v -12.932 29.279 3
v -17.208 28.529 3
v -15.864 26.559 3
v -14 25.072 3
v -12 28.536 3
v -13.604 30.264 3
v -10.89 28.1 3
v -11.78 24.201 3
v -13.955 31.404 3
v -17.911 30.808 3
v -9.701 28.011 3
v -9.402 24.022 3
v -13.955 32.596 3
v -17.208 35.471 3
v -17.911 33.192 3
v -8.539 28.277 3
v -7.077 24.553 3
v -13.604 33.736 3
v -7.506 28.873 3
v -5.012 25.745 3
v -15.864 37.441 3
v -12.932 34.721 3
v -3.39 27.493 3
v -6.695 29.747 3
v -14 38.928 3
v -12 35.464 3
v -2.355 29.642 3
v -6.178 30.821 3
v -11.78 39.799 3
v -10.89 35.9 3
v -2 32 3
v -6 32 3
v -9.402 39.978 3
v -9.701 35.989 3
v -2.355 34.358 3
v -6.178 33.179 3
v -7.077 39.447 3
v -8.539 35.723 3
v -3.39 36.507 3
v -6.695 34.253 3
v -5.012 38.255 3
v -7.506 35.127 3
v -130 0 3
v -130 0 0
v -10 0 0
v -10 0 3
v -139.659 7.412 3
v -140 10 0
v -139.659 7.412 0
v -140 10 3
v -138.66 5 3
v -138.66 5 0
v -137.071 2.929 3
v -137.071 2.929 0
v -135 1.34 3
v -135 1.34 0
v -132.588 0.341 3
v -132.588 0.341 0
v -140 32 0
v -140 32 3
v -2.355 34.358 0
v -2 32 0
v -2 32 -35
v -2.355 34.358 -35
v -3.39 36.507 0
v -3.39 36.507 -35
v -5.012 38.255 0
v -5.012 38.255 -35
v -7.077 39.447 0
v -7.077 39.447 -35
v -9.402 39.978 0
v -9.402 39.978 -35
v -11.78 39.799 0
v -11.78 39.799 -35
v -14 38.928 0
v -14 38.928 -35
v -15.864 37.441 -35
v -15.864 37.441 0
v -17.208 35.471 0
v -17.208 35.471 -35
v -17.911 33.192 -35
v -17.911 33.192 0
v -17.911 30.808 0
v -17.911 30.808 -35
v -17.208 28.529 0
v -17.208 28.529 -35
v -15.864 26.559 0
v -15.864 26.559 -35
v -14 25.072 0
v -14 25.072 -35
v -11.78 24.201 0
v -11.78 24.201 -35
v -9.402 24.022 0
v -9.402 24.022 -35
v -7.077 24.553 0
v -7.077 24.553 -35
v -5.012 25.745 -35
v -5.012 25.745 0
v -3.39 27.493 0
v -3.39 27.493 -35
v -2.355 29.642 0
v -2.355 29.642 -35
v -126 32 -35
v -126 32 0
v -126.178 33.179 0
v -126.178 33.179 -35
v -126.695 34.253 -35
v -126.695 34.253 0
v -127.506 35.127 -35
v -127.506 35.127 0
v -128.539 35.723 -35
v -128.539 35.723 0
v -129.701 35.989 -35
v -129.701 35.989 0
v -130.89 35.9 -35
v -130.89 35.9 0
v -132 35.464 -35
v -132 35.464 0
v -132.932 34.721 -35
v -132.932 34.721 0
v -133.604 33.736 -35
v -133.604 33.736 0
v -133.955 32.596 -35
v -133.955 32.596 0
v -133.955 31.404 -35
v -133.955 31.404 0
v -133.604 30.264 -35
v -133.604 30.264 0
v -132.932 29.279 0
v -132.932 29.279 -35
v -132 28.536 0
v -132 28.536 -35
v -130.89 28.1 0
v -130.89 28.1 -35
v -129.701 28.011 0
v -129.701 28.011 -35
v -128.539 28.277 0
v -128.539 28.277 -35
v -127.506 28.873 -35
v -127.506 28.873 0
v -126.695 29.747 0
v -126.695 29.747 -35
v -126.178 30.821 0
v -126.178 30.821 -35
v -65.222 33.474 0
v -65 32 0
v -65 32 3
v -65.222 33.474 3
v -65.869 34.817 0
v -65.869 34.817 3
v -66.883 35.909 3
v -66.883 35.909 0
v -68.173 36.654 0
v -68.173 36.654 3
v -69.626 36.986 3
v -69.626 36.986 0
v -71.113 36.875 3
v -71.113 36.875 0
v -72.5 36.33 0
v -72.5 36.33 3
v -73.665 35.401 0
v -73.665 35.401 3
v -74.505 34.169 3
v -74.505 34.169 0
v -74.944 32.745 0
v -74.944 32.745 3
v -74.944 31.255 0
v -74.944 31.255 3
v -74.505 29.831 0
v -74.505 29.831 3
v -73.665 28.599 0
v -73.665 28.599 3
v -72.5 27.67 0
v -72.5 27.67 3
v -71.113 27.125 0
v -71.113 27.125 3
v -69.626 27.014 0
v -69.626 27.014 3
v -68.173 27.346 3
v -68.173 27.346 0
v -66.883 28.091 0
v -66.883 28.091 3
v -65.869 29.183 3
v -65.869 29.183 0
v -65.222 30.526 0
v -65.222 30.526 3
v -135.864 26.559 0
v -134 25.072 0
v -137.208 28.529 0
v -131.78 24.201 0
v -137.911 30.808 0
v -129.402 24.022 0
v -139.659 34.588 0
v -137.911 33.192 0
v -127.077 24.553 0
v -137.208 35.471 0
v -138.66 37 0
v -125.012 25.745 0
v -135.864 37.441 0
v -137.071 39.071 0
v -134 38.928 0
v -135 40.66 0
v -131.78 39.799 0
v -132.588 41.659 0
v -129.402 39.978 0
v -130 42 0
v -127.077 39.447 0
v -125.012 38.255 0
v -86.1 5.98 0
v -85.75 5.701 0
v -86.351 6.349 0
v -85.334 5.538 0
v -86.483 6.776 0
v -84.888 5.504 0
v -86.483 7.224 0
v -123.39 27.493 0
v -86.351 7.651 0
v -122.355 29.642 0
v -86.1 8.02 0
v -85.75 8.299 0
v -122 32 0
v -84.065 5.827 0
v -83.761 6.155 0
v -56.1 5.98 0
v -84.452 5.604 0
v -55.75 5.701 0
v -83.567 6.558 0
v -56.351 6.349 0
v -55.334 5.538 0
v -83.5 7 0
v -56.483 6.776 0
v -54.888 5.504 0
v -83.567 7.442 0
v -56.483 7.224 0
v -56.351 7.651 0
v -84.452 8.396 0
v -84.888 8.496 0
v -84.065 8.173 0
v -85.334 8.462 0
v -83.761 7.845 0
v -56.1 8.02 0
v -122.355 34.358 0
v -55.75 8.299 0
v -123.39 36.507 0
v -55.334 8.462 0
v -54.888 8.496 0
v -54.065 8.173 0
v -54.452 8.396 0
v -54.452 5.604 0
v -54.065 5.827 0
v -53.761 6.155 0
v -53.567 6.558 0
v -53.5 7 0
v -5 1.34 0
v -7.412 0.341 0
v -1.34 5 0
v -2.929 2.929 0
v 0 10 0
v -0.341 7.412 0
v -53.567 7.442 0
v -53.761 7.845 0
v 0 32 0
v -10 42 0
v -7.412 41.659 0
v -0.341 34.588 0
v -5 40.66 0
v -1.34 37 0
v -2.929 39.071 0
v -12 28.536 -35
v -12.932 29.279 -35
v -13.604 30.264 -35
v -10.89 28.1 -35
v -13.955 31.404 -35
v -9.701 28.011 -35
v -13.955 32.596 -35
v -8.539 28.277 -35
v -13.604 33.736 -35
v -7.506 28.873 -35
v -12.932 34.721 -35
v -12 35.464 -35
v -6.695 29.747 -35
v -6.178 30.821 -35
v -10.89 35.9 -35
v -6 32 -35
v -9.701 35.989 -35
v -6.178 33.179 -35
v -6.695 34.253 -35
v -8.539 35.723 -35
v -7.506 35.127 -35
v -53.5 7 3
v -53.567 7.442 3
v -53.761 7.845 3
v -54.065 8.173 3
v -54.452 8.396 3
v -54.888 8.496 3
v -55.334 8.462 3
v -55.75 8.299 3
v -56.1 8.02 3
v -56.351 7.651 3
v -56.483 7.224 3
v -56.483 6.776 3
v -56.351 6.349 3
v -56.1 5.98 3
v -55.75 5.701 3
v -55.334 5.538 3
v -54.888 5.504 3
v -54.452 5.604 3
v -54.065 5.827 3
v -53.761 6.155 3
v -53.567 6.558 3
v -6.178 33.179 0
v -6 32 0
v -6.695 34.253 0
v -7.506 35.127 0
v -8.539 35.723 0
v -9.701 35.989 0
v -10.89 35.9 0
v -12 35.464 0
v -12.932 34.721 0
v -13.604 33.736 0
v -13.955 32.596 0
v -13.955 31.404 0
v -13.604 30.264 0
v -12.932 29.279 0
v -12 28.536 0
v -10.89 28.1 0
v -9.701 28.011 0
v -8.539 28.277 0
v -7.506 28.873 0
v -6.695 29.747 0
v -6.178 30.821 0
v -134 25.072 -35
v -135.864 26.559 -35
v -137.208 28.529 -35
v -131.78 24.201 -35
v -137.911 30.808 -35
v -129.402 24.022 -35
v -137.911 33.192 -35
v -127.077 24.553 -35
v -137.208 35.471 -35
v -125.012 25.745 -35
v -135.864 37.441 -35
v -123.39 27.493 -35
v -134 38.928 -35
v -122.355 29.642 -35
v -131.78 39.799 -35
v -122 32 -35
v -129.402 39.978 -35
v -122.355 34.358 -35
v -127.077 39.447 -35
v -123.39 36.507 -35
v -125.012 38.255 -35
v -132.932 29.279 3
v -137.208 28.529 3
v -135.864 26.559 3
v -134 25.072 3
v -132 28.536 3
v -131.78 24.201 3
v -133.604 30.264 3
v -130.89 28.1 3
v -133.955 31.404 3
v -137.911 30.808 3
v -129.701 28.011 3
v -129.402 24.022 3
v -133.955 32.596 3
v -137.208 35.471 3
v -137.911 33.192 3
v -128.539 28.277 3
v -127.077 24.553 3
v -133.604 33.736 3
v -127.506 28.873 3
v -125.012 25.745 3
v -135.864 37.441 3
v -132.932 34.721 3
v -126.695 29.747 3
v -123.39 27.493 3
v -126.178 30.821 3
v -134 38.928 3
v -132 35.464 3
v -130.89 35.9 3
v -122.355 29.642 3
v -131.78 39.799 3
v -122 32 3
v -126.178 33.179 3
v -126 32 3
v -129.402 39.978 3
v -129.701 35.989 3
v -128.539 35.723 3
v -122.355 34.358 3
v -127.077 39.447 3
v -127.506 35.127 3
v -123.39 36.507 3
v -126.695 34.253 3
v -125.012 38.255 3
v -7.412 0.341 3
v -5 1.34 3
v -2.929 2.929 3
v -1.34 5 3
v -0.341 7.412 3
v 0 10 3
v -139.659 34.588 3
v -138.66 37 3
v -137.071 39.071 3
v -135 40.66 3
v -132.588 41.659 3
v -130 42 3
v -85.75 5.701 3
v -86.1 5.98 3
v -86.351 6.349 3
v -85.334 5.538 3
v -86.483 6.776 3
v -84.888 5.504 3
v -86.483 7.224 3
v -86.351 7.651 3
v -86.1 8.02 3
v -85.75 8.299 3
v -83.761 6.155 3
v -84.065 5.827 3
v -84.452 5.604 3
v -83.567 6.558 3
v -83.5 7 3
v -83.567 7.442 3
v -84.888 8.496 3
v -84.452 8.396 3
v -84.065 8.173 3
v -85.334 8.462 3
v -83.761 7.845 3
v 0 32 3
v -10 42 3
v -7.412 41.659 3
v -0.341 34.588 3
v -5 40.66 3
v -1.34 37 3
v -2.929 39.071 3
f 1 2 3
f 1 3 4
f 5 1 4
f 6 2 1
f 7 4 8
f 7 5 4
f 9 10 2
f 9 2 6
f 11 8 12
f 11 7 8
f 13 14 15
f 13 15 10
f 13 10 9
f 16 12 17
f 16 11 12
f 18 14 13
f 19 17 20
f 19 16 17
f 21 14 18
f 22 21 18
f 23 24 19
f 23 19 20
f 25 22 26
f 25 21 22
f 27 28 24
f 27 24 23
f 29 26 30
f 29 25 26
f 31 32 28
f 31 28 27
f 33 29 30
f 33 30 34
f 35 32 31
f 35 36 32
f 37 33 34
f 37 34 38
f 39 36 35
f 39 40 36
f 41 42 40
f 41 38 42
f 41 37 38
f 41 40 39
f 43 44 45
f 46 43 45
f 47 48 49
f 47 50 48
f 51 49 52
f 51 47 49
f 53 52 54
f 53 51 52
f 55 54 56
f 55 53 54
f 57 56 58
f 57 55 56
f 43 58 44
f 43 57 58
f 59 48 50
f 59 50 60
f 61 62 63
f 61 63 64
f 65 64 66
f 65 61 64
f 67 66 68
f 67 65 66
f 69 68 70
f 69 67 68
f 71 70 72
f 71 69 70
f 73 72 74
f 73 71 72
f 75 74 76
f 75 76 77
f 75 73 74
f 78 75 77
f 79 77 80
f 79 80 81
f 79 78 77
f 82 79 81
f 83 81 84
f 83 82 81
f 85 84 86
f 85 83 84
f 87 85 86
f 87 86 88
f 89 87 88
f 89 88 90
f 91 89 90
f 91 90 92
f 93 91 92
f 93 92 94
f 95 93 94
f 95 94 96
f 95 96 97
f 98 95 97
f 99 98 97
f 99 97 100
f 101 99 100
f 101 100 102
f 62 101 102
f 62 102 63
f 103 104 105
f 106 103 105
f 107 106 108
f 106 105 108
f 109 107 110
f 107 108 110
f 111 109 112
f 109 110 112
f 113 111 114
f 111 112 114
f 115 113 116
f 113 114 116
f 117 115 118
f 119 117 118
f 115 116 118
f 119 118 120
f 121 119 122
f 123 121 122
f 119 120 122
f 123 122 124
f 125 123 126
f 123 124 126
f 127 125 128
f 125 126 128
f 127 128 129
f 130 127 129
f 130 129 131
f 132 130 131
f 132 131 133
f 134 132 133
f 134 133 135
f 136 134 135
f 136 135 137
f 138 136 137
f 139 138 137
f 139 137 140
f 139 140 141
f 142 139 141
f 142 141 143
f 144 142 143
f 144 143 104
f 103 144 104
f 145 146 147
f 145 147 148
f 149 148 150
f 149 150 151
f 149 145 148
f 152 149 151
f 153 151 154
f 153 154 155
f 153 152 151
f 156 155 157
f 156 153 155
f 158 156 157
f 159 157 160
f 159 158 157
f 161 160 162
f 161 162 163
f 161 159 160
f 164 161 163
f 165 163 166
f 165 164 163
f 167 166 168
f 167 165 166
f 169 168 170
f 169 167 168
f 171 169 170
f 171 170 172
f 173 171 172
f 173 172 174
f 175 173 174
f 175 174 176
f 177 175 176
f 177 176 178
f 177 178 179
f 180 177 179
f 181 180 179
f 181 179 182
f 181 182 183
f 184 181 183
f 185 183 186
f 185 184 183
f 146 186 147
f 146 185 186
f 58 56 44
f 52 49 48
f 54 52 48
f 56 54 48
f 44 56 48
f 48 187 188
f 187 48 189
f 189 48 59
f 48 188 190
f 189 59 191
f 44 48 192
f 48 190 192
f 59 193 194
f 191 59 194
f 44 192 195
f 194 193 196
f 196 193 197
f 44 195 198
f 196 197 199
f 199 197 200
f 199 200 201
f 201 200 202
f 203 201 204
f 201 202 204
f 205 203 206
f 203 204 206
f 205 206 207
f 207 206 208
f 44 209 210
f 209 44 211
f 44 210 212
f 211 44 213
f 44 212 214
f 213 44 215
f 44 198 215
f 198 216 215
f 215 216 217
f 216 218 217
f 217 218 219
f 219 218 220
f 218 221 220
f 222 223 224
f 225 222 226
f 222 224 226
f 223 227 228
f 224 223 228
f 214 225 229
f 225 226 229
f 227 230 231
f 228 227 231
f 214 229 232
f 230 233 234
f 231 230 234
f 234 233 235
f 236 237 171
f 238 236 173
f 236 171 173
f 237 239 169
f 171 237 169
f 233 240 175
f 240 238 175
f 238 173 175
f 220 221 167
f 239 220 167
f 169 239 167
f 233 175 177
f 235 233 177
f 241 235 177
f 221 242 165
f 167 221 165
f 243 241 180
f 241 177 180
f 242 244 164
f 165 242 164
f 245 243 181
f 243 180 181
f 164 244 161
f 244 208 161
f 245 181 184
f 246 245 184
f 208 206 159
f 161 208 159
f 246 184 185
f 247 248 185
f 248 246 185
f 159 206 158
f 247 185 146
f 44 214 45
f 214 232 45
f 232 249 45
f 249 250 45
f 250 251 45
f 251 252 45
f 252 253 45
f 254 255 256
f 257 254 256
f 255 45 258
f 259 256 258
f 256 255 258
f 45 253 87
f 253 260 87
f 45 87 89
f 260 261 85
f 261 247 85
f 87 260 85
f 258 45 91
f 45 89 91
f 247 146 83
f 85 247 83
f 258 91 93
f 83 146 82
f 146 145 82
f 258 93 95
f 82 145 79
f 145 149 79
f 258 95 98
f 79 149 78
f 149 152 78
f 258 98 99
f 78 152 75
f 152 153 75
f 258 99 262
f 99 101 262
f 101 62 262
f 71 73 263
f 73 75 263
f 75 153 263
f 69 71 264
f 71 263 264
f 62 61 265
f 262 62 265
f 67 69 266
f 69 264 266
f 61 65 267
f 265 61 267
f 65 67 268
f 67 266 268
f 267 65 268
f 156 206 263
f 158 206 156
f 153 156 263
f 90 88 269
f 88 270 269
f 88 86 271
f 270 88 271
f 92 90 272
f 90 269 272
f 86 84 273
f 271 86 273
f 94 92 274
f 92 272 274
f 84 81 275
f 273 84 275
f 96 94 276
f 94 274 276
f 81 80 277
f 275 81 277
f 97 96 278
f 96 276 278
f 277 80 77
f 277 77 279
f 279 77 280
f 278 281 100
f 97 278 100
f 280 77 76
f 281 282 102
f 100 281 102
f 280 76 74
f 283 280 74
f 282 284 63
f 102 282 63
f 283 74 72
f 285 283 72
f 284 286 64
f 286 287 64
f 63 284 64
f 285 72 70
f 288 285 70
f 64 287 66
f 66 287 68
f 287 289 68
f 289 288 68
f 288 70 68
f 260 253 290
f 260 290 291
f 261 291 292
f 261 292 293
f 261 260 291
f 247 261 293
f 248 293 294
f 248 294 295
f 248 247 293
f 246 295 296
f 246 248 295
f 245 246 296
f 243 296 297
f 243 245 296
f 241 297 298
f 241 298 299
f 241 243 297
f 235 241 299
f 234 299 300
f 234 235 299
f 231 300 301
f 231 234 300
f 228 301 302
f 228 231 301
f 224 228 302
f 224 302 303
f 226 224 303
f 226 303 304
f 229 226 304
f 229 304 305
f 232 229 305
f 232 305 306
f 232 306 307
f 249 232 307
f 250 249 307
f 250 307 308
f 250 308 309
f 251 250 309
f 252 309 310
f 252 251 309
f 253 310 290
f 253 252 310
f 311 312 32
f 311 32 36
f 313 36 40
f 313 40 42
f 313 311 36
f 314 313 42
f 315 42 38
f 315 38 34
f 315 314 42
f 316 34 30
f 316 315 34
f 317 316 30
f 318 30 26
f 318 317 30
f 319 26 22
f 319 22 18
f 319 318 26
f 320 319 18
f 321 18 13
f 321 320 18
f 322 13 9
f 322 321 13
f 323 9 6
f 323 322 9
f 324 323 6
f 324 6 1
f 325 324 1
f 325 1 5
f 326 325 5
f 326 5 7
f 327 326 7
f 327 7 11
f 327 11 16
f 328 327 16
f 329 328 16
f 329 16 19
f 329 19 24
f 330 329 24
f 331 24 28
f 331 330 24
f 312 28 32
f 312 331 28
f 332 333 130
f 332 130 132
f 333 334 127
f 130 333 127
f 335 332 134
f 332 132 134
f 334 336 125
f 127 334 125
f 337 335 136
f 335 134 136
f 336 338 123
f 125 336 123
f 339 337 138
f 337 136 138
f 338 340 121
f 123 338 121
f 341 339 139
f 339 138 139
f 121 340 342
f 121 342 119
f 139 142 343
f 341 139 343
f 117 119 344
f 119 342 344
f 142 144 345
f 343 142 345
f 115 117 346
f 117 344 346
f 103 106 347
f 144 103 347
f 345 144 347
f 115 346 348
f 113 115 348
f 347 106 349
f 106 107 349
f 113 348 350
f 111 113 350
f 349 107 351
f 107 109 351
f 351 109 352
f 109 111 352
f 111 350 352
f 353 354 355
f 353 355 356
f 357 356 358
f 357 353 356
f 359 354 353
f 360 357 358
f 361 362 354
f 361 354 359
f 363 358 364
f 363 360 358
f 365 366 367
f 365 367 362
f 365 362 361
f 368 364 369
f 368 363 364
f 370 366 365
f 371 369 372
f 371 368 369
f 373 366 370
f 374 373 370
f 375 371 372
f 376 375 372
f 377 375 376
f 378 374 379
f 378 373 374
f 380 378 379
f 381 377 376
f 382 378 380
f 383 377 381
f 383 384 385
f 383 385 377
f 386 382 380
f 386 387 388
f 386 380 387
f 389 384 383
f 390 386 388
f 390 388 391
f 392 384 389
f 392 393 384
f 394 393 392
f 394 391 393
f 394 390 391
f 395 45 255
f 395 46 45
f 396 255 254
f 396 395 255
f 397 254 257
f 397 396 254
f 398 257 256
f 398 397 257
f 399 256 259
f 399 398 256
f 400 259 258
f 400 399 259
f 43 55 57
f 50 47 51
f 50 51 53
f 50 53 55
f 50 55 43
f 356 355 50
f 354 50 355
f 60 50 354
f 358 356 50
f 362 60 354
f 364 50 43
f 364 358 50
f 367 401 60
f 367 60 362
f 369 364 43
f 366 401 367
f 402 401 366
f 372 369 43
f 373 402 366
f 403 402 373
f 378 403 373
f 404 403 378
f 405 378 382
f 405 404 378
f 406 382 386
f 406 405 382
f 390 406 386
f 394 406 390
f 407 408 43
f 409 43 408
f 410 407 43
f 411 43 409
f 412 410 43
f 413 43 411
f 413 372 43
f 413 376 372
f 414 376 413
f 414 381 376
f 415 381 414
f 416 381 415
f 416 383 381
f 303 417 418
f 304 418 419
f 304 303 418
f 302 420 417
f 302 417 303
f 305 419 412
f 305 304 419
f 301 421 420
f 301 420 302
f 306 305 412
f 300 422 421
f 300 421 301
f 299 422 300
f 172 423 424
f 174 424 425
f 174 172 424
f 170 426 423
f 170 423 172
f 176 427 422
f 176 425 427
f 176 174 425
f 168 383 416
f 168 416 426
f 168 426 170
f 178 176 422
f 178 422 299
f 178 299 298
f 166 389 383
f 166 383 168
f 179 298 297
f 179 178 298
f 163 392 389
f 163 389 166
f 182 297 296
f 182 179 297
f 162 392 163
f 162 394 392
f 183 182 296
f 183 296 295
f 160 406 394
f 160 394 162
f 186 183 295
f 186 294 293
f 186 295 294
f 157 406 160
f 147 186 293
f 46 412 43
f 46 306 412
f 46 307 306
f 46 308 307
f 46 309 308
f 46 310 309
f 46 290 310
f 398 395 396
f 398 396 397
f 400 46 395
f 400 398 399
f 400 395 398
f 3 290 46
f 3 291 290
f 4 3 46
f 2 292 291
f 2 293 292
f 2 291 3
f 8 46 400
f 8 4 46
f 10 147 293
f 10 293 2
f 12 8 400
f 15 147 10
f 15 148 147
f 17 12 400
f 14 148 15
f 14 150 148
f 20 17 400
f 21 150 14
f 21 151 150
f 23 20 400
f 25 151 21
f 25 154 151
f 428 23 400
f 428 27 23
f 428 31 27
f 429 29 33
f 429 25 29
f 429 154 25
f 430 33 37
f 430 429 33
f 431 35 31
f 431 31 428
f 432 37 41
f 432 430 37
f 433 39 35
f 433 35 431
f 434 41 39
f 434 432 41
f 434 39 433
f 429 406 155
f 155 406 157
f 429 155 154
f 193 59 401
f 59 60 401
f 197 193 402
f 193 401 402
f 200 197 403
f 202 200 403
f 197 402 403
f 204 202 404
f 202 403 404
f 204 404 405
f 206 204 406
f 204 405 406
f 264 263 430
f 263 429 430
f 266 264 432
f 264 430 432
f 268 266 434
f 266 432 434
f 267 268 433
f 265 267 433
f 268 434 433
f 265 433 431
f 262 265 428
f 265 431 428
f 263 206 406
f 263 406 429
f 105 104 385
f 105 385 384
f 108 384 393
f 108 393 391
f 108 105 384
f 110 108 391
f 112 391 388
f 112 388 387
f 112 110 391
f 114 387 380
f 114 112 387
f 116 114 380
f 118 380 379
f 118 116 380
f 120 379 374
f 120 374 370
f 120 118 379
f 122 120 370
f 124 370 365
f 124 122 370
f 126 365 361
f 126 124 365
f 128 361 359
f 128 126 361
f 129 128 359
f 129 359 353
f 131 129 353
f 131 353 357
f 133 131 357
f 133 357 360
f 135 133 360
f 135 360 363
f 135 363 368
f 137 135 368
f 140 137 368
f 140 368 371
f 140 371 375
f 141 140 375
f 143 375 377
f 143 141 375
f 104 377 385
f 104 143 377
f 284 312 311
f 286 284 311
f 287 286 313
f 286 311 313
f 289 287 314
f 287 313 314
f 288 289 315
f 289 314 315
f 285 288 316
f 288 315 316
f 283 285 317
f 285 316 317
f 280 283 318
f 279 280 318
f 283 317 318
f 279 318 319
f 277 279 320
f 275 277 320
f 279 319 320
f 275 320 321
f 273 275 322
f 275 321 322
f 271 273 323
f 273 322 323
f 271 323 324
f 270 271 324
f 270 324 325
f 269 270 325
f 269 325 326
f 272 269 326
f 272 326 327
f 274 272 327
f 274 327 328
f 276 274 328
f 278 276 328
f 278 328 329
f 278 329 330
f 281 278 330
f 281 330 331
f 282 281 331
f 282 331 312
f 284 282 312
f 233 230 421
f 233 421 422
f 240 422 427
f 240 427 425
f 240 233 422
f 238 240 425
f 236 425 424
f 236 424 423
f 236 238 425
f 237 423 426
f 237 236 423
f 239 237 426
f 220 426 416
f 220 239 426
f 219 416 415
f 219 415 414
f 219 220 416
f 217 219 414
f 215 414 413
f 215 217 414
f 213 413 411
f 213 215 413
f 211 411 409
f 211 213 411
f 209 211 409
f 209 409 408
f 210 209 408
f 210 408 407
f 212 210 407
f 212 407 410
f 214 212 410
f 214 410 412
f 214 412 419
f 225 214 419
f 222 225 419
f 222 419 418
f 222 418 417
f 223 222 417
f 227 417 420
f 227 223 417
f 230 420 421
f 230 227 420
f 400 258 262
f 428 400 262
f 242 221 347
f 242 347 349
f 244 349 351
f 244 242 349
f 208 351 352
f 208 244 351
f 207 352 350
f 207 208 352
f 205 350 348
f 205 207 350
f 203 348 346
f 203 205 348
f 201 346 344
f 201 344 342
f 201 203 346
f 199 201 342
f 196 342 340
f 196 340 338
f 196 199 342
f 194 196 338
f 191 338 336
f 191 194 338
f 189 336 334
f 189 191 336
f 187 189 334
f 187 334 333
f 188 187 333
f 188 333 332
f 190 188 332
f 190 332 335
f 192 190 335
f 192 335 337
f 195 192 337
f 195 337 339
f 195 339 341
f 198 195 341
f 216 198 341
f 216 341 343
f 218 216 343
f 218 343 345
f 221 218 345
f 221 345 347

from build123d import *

# Parameters (mm, degrees)
ESQUISSE1_W        = 140
ESQUISSE1_H        = 42
ESQUISSE1_R        = 5
ESQUISSE1_R_2      = 4
ESQUISSE1_R_3      = 1.5
BOSS_EXTRU_1_DEPTH = 3
CONG_1_R           = 10
CONG_2_R           = 10
ESQUISSE2_R        = 8
ESQUISSE2_R_2      = 4
BOSS_EXTRU_2_DEPTH = 38


with BuildPart() as part:
    # Esquisse1 → Boss.-Extru.1 (new body)
    with BuildSketch(Plane.XY):
        with Locations((-70, 21)):
            Rectangle(ESQUISSE1_W, ESQUISSE1_H)
        with Locations((-70, 32)):
            Circle(ESQUISSE1_R, mode=Mode.SUBTRACT)
        with Locations((-130, 32)):
            Circle(ESQUISSE1_R_2, mode=Mode.SUBTRACT)
        with Locations((-55, 7)):
            Circle(ESQUISSE1_R_3, mode=Mode.SUBTRACT)
        with Locations((-10, 32)):
            Circle(ESQUISSE1_R_2, mode=Mode.SUBTRACT)
        with Locations((-85, 7)):
            Circle(ESQUISSE1_R_3, mode=Mode.SUBTRACT)
    extrude(amount=BOSS_EXTRU_1_DEPTH)

    # Congé1
    cong_1_edges = [part.edges().sort_by_distance(p)[0] for p in [
        (-140, 42, 1.5),
        (0, 42, 1.5),
    ]]
    fillet(cong_1_edges, radius=CONG_1_R)

    # Congé2
    cong_2_edges = [part.edges().sort_by_distance(p)[0] for p in [
        (0, 0, 1.5),
        (-140, 0, 1.5),
    ]]
    fillet(cong_2_edges, radius=CONG_2_R)

    # Esquisse2 → Boss.-Extru.2 (add)
    with BuildSketch(Plane.XY.offset(3)):
        with Locations((-10, 32)):
            Circle(ESQUISSE2_R)
        with Locations((-10, 32)):
            Circle(ESQUISSE2_R_2, mode=Mode.SUBTRACT)
        with Locations((-130, 32)):
            Circle(ESQUISSE2_R)
        with Locations((-130, 32)):
            Circle(ESQUISSE2_R_2, mode=Mode.SUBTRACT)
    extrude(amount=-BOSS_EXTRU_2_DEPTH)


solid = part.part
